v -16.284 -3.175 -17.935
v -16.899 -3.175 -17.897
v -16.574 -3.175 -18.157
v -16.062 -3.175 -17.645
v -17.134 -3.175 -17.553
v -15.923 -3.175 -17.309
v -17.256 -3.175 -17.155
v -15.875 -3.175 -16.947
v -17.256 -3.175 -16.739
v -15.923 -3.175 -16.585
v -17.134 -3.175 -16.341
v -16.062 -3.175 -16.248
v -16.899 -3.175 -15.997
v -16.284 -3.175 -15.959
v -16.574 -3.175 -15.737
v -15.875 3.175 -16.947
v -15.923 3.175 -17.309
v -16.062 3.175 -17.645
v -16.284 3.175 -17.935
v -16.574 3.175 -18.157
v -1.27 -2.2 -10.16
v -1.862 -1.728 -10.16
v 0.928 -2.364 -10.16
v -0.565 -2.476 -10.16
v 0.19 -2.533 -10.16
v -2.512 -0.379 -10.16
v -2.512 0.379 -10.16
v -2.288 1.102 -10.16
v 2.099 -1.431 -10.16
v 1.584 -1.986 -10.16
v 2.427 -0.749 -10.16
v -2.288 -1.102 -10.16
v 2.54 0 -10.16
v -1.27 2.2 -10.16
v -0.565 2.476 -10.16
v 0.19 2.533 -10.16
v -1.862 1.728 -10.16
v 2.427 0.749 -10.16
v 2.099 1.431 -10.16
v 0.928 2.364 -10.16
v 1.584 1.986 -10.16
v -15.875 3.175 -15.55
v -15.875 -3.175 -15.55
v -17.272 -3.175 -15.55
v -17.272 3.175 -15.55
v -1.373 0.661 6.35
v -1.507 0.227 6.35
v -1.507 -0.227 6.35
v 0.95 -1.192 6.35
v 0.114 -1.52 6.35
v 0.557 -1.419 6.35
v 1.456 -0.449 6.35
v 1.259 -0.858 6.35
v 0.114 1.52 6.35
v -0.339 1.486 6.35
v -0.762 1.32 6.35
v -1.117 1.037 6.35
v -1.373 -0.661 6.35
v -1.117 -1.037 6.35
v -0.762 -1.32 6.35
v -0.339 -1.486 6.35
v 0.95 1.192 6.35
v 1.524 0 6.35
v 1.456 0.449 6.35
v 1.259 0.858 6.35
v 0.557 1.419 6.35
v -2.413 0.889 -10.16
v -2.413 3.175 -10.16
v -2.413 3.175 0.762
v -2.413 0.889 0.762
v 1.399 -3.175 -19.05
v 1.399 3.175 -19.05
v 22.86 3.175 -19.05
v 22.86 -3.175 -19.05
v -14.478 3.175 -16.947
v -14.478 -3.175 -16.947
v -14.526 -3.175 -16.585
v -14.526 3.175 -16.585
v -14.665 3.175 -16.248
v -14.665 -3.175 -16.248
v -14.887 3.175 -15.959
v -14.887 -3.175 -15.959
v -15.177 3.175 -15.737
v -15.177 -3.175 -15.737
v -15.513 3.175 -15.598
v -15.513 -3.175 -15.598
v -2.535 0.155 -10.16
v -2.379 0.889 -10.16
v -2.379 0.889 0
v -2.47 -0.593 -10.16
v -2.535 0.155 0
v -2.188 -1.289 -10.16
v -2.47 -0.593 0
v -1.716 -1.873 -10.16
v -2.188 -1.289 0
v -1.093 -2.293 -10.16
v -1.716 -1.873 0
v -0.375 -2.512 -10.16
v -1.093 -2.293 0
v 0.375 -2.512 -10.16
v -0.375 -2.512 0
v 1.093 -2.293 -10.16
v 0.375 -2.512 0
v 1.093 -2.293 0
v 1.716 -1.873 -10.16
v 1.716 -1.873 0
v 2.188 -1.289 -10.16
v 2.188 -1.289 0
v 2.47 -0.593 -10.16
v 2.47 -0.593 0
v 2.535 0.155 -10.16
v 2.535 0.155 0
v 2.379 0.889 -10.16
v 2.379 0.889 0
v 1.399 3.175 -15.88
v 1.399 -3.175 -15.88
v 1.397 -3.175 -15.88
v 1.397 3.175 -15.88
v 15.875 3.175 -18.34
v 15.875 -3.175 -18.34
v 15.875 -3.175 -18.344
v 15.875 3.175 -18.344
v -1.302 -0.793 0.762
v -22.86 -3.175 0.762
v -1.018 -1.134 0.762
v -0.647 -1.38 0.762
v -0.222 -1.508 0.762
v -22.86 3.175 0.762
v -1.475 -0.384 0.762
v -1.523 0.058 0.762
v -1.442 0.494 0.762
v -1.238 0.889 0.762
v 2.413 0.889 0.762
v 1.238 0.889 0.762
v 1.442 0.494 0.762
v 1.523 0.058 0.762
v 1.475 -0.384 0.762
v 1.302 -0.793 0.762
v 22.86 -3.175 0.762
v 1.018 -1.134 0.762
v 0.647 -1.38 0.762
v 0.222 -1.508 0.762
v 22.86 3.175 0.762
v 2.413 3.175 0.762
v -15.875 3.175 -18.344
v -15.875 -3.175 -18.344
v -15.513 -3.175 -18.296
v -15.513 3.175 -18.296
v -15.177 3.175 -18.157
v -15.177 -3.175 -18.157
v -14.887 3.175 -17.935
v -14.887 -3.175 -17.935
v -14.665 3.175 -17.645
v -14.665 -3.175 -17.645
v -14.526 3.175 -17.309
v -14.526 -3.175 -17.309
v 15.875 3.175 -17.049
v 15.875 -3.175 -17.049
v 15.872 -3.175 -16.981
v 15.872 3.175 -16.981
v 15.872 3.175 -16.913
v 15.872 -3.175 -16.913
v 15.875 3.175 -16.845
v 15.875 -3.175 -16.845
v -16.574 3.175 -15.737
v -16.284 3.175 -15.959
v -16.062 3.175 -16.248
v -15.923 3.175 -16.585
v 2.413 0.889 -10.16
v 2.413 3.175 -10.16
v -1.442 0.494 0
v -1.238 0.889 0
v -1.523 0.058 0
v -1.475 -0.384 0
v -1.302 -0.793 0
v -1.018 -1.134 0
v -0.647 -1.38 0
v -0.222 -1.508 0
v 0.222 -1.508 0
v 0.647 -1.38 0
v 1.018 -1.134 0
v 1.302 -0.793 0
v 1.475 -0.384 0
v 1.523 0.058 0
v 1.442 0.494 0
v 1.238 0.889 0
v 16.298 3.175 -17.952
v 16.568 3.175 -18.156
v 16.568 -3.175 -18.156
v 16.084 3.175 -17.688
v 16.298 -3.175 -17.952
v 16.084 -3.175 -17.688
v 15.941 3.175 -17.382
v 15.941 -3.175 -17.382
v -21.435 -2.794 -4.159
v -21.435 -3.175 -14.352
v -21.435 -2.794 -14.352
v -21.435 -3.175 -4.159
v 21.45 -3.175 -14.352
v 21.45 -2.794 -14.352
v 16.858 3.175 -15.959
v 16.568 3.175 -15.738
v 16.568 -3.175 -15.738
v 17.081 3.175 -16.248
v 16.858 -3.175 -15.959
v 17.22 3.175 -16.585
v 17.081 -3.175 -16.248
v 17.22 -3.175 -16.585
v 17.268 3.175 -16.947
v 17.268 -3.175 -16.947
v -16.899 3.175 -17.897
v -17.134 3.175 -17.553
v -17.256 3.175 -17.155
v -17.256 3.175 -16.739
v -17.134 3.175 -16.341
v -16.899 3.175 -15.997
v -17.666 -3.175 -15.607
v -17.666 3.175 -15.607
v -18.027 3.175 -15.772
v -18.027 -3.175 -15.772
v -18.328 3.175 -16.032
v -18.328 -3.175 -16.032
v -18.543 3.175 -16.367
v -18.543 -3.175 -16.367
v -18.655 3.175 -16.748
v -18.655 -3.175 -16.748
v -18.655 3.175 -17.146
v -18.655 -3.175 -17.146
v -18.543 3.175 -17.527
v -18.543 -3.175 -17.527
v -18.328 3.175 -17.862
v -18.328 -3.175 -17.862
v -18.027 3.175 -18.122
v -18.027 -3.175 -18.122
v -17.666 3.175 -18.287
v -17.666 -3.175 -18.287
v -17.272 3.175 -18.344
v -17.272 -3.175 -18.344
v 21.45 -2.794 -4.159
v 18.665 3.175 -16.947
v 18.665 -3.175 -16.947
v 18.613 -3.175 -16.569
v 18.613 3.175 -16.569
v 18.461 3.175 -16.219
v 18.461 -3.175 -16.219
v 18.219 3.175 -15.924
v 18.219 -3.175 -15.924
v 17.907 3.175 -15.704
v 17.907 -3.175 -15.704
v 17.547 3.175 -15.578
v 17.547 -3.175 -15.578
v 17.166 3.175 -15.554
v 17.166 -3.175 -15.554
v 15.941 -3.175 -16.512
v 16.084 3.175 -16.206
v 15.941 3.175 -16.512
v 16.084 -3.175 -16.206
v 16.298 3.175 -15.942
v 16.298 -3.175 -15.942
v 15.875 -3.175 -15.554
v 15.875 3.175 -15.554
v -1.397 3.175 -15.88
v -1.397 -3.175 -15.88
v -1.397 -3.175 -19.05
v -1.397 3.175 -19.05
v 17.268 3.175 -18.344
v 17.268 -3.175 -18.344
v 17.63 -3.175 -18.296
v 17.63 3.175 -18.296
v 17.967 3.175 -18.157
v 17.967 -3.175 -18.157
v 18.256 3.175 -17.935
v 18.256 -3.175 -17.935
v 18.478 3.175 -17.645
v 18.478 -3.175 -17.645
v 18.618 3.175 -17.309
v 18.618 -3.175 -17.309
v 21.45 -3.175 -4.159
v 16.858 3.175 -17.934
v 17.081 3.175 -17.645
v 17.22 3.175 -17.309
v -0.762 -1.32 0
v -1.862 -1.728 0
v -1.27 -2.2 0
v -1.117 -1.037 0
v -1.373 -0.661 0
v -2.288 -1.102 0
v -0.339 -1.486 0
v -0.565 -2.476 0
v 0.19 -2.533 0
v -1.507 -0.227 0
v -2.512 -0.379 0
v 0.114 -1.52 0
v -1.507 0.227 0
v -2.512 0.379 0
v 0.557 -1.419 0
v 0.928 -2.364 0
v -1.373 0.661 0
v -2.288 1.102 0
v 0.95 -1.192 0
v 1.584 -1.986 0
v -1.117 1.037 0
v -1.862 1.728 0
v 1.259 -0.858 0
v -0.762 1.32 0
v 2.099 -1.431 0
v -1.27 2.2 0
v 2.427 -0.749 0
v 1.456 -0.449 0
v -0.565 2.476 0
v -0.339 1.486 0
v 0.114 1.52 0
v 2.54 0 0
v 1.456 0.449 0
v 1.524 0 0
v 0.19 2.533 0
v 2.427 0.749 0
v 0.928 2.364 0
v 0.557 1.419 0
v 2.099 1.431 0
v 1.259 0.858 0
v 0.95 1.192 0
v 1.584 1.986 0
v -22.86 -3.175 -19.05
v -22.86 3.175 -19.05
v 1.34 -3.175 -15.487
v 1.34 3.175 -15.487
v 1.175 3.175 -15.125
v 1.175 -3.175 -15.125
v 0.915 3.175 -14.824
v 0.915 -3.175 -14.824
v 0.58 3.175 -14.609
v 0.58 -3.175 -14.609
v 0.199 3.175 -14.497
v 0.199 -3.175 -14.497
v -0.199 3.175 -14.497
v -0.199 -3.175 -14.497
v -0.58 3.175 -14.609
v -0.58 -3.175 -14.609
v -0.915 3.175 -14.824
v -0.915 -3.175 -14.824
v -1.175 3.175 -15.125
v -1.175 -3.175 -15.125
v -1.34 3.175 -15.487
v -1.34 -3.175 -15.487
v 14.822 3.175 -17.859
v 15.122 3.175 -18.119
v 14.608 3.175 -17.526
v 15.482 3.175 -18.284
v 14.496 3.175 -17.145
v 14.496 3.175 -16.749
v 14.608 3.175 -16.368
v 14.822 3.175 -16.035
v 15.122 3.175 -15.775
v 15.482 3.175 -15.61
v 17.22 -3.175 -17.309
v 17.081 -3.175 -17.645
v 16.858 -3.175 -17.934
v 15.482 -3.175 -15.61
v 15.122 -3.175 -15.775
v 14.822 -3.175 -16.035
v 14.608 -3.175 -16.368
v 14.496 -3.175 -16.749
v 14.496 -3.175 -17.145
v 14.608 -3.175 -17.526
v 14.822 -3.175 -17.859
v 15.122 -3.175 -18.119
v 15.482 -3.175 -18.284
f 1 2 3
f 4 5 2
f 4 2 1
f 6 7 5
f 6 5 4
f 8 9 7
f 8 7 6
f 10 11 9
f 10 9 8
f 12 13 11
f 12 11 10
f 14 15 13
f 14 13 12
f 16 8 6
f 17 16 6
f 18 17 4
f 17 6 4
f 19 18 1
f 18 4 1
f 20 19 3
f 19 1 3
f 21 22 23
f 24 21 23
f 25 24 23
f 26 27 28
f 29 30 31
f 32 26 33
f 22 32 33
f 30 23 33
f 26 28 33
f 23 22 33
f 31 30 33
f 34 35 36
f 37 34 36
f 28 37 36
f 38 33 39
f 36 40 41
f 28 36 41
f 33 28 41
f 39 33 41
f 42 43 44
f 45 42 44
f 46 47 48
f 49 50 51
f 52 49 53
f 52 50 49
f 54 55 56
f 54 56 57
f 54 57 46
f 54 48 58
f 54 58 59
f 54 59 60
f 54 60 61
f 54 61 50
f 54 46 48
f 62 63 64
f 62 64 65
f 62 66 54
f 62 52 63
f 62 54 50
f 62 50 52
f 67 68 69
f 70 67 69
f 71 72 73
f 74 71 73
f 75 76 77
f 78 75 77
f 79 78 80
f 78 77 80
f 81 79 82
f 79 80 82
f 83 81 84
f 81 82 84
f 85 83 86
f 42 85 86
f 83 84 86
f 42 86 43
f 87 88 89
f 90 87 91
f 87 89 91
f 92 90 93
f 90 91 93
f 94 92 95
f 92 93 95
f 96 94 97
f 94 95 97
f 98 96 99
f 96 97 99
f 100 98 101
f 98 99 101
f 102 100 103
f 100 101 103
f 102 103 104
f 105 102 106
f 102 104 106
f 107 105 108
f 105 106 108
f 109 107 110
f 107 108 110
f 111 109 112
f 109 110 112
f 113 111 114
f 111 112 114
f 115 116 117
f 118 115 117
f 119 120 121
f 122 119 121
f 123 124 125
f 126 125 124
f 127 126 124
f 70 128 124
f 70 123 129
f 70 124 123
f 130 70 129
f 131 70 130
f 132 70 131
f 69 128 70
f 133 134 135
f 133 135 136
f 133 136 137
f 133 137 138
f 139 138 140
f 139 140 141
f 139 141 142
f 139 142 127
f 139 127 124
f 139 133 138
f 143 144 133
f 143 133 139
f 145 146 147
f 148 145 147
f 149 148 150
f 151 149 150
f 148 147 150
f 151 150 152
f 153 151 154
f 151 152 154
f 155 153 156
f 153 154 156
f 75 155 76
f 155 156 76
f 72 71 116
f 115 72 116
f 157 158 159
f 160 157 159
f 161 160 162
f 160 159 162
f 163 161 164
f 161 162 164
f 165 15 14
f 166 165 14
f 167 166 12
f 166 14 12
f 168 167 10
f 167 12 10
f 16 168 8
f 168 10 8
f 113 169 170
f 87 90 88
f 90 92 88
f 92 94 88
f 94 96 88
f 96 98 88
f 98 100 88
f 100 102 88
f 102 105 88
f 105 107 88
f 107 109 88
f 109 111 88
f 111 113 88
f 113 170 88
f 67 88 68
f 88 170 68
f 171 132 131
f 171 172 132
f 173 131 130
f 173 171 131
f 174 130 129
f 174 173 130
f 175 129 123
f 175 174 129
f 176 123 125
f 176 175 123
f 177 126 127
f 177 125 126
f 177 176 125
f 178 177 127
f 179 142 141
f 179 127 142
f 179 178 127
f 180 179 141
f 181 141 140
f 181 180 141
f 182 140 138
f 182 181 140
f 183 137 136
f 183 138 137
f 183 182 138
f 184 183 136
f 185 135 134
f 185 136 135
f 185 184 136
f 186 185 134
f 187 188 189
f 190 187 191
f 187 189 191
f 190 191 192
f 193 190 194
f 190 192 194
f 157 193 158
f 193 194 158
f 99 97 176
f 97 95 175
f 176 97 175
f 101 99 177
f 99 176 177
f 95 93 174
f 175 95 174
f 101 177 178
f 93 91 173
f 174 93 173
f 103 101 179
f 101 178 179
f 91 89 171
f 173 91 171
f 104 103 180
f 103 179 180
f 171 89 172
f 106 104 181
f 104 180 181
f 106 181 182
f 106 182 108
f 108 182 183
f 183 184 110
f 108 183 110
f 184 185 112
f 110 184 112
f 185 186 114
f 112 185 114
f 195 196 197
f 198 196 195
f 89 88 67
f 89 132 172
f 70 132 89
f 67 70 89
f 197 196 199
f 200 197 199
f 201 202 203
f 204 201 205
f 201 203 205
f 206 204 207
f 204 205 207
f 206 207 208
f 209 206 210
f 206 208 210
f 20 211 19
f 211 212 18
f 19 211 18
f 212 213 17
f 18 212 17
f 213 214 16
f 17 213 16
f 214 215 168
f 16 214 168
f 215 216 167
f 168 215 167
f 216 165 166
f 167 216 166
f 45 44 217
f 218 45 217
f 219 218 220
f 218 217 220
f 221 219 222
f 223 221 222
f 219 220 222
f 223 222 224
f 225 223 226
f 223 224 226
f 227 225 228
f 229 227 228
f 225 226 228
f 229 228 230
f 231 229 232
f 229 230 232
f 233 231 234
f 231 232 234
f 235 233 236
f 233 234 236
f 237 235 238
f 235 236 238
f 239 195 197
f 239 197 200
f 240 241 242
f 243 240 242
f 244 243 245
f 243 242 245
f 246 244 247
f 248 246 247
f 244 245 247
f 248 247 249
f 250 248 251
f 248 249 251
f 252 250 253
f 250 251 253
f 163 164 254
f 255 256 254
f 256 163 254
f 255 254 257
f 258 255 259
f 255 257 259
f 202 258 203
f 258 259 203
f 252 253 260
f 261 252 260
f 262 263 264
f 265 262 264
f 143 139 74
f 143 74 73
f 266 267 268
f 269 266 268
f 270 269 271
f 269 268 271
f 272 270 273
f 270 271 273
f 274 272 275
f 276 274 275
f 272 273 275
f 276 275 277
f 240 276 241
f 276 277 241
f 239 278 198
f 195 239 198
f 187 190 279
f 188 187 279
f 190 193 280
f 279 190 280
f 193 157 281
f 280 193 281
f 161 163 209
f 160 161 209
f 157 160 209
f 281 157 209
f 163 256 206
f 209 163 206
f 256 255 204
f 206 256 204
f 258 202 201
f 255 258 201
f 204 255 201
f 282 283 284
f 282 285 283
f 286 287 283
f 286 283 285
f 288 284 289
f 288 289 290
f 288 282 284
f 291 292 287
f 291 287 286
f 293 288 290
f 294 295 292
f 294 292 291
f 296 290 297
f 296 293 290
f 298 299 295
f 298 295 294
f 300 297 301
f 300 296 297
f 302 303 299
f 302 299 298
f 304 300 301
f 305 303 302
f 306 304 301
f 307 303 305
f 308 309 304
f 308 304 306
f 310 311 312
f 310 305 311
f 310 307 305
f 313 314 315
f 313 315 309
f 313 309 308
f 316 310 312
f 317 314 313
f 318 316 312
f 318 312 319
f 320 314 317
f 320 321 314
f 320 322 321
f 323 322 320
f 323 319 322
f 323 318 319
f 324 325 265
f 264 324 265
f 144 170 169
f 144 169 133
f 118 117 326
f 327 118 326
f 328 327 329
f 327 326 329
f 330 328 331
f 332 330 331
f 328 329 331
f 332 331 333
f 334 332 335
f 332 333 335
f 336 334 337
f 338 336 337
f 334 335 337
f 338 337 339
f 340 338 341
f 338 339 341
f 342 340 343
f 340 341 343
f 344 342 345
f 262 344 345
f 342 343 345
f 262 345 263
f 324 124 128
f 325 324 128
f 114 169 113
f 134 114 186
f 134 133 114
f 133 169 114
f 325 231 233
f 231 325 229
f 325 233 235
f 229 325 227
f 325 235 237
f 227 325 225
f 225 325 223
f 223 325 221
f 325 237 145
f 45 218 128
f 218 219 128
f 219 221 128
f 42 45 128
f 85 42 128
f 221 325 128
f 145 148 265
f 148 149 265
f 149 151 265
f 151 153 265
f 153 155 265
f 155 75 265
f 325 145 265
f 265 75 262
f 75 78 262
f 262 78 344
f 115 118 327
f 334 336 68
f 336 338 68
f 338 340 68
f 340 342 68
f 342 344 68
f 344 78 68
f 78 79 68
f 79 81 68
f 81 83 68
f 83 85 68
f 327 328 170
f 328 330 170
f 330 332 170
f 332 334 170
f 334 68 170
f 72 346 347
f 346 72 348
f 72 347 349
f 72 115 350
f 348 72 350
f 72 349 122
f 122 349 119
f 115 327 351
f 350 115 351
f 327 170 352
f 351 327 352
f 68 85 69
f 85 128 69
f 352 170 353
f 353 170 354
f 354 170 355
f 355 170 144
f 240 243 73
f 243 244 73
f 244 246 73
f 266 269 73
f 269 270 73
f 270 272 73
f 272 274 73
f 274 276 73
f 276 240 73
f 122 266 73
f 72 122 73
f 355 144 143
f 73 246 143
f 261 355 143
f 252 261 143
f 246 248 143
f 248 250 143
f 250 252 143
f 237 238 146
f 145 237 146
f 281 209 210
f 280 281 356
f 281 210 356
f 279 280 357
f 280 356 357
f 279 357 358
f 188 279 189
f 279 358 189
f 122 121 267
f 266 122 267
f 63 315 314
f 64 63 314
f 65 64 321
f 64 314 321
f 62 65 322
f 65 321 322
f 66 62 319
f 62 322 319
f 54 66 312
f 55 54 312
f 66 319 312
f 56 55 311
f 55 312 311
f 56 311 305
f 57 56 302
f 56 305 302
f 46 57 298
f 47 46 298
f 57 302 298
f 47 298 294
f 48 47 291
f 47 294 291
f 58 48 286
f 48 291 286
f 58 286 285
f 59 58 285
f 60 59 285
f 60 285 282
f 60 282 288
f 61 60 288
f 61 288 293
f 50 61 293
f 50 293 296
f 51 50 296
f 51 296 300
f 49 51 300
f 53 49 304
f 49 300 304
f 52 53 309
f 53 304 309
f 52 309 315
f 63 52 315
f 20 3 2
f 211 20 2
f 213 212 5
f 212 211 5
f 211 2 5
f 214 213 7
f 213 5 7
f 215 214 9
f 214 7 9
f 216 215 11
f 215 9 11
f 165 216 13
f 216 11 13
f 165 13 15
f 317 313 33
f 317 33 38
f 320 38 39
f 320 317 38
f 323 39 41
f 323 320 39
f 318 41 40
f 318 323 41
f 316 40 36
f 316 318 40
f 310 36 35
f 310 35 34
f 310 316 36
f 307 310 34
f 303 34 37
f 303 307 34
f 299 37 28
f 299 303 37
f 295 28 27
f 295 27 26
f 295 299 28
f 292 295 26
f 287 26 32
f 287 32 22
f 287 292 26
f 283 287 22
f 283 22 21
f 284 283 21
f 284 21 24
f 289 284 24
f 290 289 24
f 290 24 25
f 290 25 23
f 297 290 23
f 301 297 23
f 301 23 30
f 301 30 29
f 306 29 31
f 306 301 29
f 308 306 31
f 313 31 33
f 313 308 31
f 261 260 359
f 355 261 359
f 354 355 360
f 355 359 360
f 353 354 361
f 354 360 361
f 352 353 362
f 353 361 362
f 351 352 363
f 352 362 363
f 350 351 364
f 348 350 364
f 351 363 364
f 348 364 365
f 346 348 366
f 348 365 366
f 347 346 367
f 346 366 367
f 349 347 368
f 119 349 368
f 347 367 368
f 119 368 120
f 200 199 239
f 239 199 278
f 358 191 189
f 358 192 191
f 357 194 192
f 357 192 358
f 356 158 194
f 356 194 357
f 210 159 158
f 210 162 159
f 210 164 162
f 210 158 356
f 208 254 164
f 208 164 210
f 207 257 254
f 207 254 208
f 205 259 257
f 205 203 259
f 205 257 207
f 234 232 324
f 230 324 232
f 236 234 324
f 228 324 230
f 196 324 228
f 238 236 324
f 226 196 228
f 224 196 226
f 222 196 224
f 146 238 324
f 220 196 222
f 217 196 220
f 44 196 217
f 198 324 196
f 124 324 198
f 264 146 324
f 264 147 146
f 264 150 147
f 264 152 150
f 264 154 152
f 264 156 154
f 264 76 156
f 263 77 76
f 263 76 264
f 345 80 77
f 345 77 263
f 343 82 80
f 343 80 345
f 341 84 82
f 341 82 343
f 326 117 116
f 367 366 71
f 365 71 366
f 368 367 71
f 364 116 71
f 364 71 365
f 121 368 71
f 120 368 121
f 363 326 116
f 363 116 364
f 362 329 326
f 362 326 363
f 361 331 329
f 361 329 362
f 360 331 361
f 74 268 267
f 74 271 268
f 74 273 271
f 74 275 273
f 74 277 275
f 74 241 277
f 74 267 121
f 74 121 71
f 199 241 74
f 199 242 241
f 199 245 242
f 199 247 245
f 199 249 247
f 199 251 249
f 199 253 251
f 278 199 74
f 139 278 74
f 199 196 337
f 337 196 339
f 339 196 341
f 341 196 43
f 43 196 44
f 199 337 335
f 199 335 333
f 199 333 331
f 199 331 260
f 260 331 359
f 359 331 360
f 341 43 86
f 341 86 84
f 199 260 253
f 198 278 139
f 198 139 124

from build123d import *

# Parameters (mm, degrees)
F0_R      = 1.524
F2_DEPTH  = 6.35
F1_R      = 2.54
F3_DEPTH  = 10.16
F4_W      = 45.72
F4_H      = 6.35
F5_DEPTH  = 13.97
F6_DEPTH  = 0.762
F7_DEPTH  = 10.16
F8_DEPTH  = 1.27
F9_DEPTH  = 5.08
F11_DEPTH = 25.4
F12_W     = 21.4504245669
F12_H     = 10.1925823838
F12_W_2   = 21.4354675263
F13_DEPTH = 0.381
F14_W     = 4.826
F14_H     = 20.32
F15_DEPTH = 2.286


with BuildPart() as f2:
    # F0 (on Top) → F2 (new body)
    with BuildSketch(Plane.XY):
        Circle(F0_R)
    extrude(amount=F2_DEPTH)

    # F1 (on Top) → F3 (join)
    with BuildSketch(Plane.XY):
        Circle(F1_R)
    extrude(amount=-F3_DEPTH)


with BuildPart() as f5:
    # F4 (on Top) → F5 (new body)
    with BuildSketch(Plane.XY):
        Rectangle(F4_W, F4_H)
    extrude(amount=-F5_DEPTH)

    # F6 (add): a face of the model
    f6_faces = [f5.faces().sort_by_distance(p)[0] for p in [
        (0, 0, 0),
    ]]
    extrude(f6_faces, amount=F6_DEPTH)

    # F1 (on Top) → F7 (cut)
    with BuildSketch(Plane.XY):
        Circle(F1_R)
    extrude(amount=-F7_DEPTH, mode=Mode.SUBTRACT)

    # F0 (on Top) → F8 (cut)
    with BuildSketch(Plane.XY):
        Circle(F0_R)
    extrude(amount=F8_DEPTH, mode=Mode.SUBTRACT)

    # F9 (add): a face of the model
    f9_faces = [f5.faces().sort_by_distance(p)[0] for p in [
        (0, 0, -13.97),
    ]]
    extrude(f9_faces, amount=F9_DEPTH)

    # F10 (on face) → F11 (cut)
    with BuildSketch(Plane.XZ.offset(3.175)):
        with BuildLine():
            ThreePointArc((-15.875, -18.3439323009), (-14.8871718267, -17.9347604742), (-14.478, -16.9469323009))
            ThreePointArc((-14.478, -16.9469323009), (-14.8871718267, -15.9591041276), (-15.875, -15.5499323009))
            ThreePointArc((-15.875, -15.5499323009), (-16.236570206, -15.5975339216), (-16.5735, -15.7370948118))
            ThreePointArc((-16.5735, -15.7370948118), (-16.0621625109, -16.2484323009), (-15.875, -16.9469323009))
            ThreePointArc((-15.875, -16.9469323009), (-16.0621625109, -17.6454323009), (-16.5735, -18.15676979))
            ThreePointArc((-16.5735, -18.15676979), (-16.236570206, -18.2963306803), (-15.875, -18.3439323009))
        make_face()
        with BuildLine():
            ThreePointArc((-16.5735, -15.7370948118), (-16.236570206, -15.5975339216), (-15.875, -15.5499323009))
            Line((-15.875, -15.5499323009), (-17.272, -15.5499323009))
            ThreePointArc((-17.272, -15.5499323009), (-16.910429794, -15.5975339216), (-16.5735, -15.7370948118))
        make_face()
        with BuildLine():
            Line((-17.272, -18.3439323009), (-15.875, -18.3439323009))
            ThreePointArc((-15.875, -18.3439323009), (-16.236570206, -18.2963306803), (-16.5735, -18.15676979))
            ThreePointArc((-16.5735, -18.15676979), (-16.910429794, -18.2963306803), (-17.272, -18.3439323009))
        make_face()
        with BuildLine():
            ThreePointArc((-16.5735, -18.15676979), (-17.272, -16.9469323009), (-16.5735, -15.7370948118))
            ThreePointArc((-16.5735, -15.7370948118), (-16.910429794, -15.5975339216), (-17.272, -15.5499323009))
            ThreePointArc((-17.272, -15.5499323009), (-18.669, -16.9469323009), (-17.272, -18.3439323009))
            ThreePointArc((-17.272, -18.3439323009), (-16.910429794, -18.2963306803), (-16.5735, -18.15676979))
        make_face()
        with BuildLine():
            Line((17.2682517423, -18.3439323009), (17.2682517423, -16.9469323009))
            ThreePointArc((17.2682517423, -16.9469323009), (17.0805074315, -17.6454323009), (16.5678725715, -18.1556829026))
            ThreePointArc((16.5678725715, -18.1556829026), (16.9056332035, -18.2960493438), (17.2682517423, -18.3439323009))
        make_face()
        with BuildLine():
            ThreePointArc((16.5678725715, -15.7381816992), (17.0805074315, -16.2484323009), (17.2682517423, -16.9469323009))
            Line((17.2682517423, -16.9469323009), (17.2682517423, -15.5536805586))
            Line((17.2682517423, -15.5536805586), (17.1659845309, -15.5536805586))
            ThreePointArc((17.1659845309, -15.5536805586), (16.8564623891, -15.6120021422), (16.5678725715, -15.7381816992))
        make_face()
        with BuildLine():
            Line((17.2682517423, -15.5536805586), (17.2682517423, -16.9469323009))
            Line((17.2682517423, -16.9469323009), (17.2682517423, -18.3439323009))
            ThreePointArc((17.2682517423, -18.3439323009), (18.2560799156, -17.9347604742), (18.6652517423, -16.9469323009))
            ThreePointArc((18.6652517423, -16.9469323009), (18.2192358919, -15.9235857579), (17.1659845309, -15.5536805586))
            Line((17.1659845309, -15.5536805586), (17.2682517423, -15.5536805586))
        make_face()
        with BuildLine():
            ThreePointArc((15.875, -16.8446650895), (16.0842335949, -16.205507978), (16.5678725715, -15.7381816992))
            ThreePointArc((16.5678725715, -15.7381816992), (16.2335083929, -15.6005957347), (15.875, -15.5536805586))
            Line((15.875, -15.5536805586), (15.875, -16.8446650895))
        make_face()
        with BuildLine():
            ThreePointArc((15.875, -15.5536805586), (16.2335083929, -15.6005957347), (16.5678725715, -15.7381816992))
            ThreePointArc((16.5678725715, -15.7381816992), (16.8564623891, -15.6120021422), (17.1659845309, -15.5536805586))
            Line((17.1659845309, -15.5536805586), (15.875, -15.5536805586))
        make_face()
        with BuildLine():
            ThreePointArc((17.2682517423, -18.3439323009), (16.9056332035, -18.2960493438), (16.5678725715, -18.1556829026))
            ThreePointArc((16.5678725715, -18.1556829026), (16.2335083929, -18.2932688672), (15.875, -18.3401840432))
            Line((15.875, -18.3401840432), (15.875, -18.3439323009))
            Line((15.875, -18.3439323009), (17.2682517423, -18.3439323009))
        make_face()
        with BuildLine():
            ThreePointArc((15.875, -18.3401840432), (16.2335083929, -18.2932688672), (16.5678725715, -18.1556829026))
            ThreePointArc((16.5678725715, -18.1556829026), (16.0842335949, -17.6883566239), (15.875, -17.0491995123))
            Line((15.875, -17.0491995123), (15.875, -18.3401840432))
        make_face()
        with BuildLine():
            Line((15.875, -16.8446650895), (15.875, -15.5536805586))
            ThreePointArc((15.875, -15.5536805586), (14.4817482577, -16.9469323009), (15.875, -18.3401840432))
            Line((15.875, -18.3401840432), (15.875, -17.0491995123))
            ThreePointArc((15.875, -17.0491995123), (15.8712517423, -16.9469323009), (15.875, -16.8446650895))
        make_face()
        with BuildLine():
            Line((-1.397, -15.8801323009), (1.397, -15.8801323009))
            ThreePointArc((1.397, -15.8801323009), (0, -14.4831323009), (-1.397, -15.8801323009))
        make_face()
        with BuildLine():
            Line((1.3987992425, -15.8801323009), (1.397, -15.8801323009))
            ThreePointArc((1.397, -15.8801323009), (0, -17.2771323009), (-1.397, -15.8801323009))
            Line((-1.397, -15.8801323009), (-1.397, -20.1916601509))
            Line((-1.397, -20.1916601509), (1.3987992425, -20.1916601509))
            Line((1.3987992425, -20.1916601509), (1.3987992425, -15.8801323009))
        make_face()
        with BuildLine():
            ThreePointArc((-1.397, -15.8801323009), (0, -17.2771323009), (1.397, -15.8801323009))
            Line((1.397, -15.8801323009), (-1.397, -15.8801323009))
        make_face()
    extrude(amount=-F11_DEPTH, mode=Mode.SUBTRACT)

    # F12 (on face) → F13 (cut)
    with BuildSketch(Plane.XZ.offset(3.175)):
        with Locations((10.7252122834, -9.2556457967)):
            Rectangle(F12_W, F12_H)
        with Locations((-10.7177337632, -9.2556457967)):
            Rectangle(F12_W_2, F12_H)
    extrude(amount=-F13_DEPTH, mode=Mode.SUBTRACT)

    # F14 (on face) → F15 (cut)
    with BuildSketch(Plane(origin=(0, 3.175, 0), x_dir=(-1, 0, 0), z_dir=(0, 1, 0))):
        Rectangle(F14_W, F14_H)
    extrude(amount=-F15_DEPTH, mode=Mode.SUBTRACT)


solid = Compound([f2.part, f5.part])
